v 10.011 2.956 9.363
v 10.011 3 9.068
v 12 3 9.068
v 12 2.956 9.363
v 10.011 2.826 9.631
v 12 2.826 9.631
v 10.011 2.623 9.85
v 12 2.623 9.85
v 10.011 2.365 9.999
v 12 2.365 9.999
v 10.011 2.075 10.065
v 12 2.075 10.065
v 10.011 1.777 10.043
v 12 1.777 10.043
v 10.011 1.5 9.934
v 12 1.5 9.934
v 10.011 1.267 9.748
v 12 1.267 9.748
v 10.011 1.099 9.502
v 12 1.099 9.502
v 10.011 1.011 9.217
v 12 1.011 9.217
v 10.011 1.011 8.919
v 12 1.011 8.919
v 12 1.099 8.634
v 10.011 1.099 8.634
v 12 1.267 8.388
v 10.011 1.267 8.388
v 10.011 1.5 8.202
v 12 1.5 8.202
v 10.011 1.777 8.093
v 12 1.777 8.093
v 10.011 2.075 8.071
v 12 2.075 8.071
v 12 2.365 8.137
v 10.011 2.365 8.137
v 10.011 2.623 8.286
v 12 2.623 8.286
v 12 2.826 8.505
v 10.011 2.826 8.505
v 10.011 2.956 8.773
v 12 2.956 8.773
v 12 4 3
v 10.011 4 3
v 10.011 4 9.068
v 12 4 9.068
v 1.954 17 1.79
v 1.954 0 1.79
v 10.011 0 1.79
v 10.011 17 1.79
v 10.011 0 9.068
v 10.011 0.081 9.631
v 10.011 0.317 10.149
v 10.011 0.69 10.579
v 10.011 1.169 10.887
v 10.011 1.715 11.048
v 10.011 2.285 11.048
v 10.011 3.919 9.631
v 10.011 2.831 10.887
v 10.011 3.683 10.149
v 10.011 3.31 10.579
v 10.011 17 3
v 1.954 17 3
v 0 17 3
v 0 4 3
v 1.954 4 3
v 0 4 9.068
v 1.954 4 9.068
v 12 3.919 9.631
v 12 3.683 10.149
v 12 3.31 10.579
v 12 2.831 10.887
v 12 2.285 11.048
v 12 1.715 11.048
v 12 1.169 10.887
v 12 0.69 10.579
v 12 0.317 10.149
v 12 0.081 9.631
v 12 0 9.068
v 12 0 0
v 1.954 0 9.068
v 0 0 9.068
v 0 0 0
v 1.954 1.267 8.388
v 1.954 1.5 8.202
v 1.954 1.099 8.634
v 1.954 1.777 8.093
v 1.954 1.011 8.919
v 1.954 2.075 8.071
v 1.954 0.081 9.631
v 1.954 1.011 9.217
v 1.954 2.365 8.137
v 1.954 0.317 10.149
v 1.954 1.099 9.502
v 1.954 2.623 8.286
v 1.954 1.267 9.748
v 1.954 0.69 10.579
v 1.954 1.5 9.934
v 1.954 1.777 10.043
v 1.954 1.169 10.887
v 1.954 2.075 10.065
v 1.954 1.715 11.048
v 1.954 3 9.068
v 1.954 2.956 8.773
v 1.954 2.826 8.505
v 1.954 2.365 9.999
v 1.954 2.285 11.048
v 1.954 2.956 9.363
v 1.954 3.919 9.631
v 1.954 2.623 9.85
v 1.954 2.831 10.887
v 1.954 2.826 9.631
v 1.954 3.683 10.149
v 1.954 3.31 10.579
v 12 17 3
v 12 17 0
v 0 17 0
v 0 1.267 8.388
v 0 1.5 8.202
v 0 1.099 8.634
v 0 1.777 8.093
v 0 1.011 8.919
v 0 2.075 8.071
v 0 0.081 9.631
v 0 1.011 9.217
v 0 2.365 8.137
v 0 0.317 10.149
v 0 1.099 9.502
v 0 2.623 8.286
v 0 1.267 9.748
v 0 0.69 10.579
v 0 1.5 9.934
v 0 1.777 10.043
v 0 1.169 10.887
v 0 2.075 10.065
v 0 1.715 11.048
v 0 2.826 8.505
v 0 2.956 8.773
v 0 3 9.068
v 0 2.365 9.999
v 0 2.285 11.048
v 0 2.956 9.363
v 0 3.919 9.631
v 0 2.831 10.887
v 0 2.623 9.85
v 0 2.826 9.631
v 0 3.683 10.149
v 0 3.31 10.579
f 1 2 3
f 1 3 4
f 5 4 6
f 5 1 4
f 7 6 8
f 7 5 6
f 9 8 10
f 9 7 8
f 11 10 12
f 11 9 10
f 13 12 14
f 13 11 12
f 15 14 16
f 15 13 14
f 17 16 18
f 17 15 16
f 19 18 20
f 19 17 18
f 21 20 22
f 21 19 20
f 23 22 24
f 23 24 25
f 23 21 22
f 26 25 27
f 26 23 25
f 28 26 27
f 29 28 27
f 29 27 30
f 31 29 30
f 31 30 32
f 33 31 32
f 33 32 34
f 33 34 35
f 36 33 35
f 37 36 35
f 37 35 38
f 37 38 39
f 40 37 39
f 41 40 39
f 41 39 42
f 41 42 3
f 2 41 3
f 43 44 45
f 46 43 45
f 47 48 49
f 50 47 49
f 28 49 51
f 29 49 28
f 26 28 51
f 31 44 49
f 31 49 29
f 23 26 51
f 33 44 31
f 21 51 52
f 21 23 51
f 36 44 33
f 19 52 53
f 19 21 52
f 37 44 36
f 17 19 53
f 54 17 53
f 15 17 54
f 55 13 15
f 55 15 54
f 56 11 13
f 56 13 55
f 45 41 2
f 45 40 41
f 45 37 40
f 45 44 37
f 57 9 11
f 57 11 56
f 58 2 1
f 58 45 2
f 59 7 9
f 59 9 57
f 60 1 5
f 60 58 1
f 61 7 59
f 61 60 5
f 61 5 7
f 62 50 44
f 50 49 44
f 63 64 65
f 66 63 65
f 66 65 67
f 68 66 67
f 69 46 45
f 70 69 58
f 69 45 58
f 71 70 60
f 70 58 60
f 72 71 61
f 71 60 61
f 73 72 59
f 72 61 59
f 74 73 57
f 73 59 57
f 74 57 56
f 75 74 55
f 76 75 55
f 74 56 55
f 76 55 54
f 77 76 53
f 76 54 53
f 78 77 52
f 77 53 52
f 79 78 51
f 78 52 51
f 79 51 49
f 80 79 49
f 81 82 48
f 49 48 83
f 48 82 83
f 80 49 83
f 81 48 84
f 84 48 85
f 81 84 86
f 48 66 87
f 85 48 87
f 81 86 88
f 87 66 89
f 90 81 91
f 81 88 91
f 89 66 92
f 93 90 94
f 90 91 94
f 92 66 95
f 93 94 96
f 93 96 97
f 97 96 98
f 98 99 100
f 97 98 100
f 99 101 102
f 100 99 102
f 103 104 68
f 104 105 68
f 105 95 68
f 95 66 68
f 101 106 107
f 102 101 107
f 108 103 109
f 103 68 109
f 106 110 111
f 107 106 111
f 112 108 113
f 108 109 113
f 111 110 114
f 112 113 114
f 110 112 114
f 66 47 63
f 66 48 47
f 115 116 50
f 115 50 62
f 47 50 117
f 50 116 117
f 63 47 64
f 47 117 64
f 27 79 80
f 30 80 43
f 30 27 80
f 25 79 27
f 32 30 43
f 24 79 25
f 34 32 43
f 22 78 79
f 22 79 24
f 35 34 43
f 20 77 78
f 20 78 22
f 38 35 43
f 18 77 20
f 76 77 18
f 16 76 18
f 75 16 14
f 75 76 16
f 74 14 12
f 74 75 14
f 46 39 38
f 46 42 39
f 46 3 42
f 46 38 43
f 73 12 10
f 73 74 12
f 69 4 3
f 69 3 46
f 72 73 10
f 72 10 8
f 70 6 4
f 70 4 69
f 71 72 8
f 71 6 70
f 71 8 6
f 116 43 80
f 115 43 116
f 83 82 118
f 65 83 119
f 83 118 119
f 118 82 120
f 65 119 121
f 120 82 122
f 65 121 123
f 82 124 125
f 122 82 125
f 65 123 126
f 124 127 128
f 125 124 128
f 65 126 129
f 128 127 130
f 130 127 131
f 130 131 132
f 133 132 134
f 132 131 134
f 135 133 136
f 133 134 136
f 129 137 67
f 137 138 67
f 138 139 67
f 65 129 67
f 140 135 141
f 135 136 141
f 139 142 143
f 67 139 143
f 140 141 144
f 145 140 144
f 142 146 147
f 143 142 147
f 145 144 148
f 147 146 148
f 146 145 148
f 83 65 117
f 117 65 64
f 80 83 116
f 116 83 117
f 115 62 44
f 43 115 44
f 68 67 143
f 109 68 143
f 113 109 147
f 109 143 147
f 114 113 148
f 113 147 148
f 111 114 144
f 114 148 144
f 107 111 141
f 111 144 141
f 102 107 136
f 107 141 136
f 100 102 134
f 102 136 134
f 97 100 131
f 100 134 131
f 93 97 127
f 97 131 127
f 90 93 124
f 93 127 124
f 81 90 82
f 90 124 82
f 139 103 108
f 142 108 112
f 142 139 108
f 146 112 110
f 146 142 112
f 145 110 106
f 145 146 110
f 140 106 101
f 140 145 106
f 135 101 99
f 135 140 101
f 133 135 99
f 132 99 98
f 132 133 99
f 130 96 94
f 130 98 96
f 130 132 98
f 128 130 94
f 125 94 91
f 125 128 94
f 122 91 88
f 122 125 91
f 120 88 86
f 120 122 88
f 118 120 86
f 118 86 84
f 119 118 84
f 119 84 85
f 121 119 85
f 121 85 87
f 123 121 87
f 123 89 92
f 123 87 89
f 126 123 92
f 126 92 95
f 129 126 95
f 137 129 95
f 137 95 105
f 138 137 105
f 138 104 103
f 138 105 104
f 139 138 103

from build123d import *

# Parameters (mm, degrees)
SKETCH_R     = 1
PAD_DEPTH    = 12
SKETCH002_W  = 11.430722
SKETCH002_H  = 8.057475
POCKET_DEPTH = 17


with BuildPart() as part:
    # Sketch → Pad (new body)
    with BuildSketch(Plane.YZ):
        with BuildLine():
            Line((0, 0), (17, 0))
            Line((17, 0), (17, 3))
            Line((17, 3), (4, 3))
            Line((4, 3), (4, 9.067998))
            ThreePointArc((4, 9.067998), (2, 11.067998), (0, 9.067998))
            Line((0, 9.067998), (0, 0))
        make_face()
        with Locations((2, 9.067998)):
            Circle(SKETCH_R, mode=Mode.SUBTRACT)
    extrude(amount=PAD_DEPTH)

    # Sketch002 (on Face2 of Pad) → Pocket (cut)
    with BuildSketch(Plane.ZX.offset(17)):
        with Locations((7.505266, 5.98249)):
            Rectangle(SKETCH002_W, SKETCH002_H)
    extrude(amount=-POCKET_DEPTH, mode=Mode.SUBTRACT)


solid = part.part
